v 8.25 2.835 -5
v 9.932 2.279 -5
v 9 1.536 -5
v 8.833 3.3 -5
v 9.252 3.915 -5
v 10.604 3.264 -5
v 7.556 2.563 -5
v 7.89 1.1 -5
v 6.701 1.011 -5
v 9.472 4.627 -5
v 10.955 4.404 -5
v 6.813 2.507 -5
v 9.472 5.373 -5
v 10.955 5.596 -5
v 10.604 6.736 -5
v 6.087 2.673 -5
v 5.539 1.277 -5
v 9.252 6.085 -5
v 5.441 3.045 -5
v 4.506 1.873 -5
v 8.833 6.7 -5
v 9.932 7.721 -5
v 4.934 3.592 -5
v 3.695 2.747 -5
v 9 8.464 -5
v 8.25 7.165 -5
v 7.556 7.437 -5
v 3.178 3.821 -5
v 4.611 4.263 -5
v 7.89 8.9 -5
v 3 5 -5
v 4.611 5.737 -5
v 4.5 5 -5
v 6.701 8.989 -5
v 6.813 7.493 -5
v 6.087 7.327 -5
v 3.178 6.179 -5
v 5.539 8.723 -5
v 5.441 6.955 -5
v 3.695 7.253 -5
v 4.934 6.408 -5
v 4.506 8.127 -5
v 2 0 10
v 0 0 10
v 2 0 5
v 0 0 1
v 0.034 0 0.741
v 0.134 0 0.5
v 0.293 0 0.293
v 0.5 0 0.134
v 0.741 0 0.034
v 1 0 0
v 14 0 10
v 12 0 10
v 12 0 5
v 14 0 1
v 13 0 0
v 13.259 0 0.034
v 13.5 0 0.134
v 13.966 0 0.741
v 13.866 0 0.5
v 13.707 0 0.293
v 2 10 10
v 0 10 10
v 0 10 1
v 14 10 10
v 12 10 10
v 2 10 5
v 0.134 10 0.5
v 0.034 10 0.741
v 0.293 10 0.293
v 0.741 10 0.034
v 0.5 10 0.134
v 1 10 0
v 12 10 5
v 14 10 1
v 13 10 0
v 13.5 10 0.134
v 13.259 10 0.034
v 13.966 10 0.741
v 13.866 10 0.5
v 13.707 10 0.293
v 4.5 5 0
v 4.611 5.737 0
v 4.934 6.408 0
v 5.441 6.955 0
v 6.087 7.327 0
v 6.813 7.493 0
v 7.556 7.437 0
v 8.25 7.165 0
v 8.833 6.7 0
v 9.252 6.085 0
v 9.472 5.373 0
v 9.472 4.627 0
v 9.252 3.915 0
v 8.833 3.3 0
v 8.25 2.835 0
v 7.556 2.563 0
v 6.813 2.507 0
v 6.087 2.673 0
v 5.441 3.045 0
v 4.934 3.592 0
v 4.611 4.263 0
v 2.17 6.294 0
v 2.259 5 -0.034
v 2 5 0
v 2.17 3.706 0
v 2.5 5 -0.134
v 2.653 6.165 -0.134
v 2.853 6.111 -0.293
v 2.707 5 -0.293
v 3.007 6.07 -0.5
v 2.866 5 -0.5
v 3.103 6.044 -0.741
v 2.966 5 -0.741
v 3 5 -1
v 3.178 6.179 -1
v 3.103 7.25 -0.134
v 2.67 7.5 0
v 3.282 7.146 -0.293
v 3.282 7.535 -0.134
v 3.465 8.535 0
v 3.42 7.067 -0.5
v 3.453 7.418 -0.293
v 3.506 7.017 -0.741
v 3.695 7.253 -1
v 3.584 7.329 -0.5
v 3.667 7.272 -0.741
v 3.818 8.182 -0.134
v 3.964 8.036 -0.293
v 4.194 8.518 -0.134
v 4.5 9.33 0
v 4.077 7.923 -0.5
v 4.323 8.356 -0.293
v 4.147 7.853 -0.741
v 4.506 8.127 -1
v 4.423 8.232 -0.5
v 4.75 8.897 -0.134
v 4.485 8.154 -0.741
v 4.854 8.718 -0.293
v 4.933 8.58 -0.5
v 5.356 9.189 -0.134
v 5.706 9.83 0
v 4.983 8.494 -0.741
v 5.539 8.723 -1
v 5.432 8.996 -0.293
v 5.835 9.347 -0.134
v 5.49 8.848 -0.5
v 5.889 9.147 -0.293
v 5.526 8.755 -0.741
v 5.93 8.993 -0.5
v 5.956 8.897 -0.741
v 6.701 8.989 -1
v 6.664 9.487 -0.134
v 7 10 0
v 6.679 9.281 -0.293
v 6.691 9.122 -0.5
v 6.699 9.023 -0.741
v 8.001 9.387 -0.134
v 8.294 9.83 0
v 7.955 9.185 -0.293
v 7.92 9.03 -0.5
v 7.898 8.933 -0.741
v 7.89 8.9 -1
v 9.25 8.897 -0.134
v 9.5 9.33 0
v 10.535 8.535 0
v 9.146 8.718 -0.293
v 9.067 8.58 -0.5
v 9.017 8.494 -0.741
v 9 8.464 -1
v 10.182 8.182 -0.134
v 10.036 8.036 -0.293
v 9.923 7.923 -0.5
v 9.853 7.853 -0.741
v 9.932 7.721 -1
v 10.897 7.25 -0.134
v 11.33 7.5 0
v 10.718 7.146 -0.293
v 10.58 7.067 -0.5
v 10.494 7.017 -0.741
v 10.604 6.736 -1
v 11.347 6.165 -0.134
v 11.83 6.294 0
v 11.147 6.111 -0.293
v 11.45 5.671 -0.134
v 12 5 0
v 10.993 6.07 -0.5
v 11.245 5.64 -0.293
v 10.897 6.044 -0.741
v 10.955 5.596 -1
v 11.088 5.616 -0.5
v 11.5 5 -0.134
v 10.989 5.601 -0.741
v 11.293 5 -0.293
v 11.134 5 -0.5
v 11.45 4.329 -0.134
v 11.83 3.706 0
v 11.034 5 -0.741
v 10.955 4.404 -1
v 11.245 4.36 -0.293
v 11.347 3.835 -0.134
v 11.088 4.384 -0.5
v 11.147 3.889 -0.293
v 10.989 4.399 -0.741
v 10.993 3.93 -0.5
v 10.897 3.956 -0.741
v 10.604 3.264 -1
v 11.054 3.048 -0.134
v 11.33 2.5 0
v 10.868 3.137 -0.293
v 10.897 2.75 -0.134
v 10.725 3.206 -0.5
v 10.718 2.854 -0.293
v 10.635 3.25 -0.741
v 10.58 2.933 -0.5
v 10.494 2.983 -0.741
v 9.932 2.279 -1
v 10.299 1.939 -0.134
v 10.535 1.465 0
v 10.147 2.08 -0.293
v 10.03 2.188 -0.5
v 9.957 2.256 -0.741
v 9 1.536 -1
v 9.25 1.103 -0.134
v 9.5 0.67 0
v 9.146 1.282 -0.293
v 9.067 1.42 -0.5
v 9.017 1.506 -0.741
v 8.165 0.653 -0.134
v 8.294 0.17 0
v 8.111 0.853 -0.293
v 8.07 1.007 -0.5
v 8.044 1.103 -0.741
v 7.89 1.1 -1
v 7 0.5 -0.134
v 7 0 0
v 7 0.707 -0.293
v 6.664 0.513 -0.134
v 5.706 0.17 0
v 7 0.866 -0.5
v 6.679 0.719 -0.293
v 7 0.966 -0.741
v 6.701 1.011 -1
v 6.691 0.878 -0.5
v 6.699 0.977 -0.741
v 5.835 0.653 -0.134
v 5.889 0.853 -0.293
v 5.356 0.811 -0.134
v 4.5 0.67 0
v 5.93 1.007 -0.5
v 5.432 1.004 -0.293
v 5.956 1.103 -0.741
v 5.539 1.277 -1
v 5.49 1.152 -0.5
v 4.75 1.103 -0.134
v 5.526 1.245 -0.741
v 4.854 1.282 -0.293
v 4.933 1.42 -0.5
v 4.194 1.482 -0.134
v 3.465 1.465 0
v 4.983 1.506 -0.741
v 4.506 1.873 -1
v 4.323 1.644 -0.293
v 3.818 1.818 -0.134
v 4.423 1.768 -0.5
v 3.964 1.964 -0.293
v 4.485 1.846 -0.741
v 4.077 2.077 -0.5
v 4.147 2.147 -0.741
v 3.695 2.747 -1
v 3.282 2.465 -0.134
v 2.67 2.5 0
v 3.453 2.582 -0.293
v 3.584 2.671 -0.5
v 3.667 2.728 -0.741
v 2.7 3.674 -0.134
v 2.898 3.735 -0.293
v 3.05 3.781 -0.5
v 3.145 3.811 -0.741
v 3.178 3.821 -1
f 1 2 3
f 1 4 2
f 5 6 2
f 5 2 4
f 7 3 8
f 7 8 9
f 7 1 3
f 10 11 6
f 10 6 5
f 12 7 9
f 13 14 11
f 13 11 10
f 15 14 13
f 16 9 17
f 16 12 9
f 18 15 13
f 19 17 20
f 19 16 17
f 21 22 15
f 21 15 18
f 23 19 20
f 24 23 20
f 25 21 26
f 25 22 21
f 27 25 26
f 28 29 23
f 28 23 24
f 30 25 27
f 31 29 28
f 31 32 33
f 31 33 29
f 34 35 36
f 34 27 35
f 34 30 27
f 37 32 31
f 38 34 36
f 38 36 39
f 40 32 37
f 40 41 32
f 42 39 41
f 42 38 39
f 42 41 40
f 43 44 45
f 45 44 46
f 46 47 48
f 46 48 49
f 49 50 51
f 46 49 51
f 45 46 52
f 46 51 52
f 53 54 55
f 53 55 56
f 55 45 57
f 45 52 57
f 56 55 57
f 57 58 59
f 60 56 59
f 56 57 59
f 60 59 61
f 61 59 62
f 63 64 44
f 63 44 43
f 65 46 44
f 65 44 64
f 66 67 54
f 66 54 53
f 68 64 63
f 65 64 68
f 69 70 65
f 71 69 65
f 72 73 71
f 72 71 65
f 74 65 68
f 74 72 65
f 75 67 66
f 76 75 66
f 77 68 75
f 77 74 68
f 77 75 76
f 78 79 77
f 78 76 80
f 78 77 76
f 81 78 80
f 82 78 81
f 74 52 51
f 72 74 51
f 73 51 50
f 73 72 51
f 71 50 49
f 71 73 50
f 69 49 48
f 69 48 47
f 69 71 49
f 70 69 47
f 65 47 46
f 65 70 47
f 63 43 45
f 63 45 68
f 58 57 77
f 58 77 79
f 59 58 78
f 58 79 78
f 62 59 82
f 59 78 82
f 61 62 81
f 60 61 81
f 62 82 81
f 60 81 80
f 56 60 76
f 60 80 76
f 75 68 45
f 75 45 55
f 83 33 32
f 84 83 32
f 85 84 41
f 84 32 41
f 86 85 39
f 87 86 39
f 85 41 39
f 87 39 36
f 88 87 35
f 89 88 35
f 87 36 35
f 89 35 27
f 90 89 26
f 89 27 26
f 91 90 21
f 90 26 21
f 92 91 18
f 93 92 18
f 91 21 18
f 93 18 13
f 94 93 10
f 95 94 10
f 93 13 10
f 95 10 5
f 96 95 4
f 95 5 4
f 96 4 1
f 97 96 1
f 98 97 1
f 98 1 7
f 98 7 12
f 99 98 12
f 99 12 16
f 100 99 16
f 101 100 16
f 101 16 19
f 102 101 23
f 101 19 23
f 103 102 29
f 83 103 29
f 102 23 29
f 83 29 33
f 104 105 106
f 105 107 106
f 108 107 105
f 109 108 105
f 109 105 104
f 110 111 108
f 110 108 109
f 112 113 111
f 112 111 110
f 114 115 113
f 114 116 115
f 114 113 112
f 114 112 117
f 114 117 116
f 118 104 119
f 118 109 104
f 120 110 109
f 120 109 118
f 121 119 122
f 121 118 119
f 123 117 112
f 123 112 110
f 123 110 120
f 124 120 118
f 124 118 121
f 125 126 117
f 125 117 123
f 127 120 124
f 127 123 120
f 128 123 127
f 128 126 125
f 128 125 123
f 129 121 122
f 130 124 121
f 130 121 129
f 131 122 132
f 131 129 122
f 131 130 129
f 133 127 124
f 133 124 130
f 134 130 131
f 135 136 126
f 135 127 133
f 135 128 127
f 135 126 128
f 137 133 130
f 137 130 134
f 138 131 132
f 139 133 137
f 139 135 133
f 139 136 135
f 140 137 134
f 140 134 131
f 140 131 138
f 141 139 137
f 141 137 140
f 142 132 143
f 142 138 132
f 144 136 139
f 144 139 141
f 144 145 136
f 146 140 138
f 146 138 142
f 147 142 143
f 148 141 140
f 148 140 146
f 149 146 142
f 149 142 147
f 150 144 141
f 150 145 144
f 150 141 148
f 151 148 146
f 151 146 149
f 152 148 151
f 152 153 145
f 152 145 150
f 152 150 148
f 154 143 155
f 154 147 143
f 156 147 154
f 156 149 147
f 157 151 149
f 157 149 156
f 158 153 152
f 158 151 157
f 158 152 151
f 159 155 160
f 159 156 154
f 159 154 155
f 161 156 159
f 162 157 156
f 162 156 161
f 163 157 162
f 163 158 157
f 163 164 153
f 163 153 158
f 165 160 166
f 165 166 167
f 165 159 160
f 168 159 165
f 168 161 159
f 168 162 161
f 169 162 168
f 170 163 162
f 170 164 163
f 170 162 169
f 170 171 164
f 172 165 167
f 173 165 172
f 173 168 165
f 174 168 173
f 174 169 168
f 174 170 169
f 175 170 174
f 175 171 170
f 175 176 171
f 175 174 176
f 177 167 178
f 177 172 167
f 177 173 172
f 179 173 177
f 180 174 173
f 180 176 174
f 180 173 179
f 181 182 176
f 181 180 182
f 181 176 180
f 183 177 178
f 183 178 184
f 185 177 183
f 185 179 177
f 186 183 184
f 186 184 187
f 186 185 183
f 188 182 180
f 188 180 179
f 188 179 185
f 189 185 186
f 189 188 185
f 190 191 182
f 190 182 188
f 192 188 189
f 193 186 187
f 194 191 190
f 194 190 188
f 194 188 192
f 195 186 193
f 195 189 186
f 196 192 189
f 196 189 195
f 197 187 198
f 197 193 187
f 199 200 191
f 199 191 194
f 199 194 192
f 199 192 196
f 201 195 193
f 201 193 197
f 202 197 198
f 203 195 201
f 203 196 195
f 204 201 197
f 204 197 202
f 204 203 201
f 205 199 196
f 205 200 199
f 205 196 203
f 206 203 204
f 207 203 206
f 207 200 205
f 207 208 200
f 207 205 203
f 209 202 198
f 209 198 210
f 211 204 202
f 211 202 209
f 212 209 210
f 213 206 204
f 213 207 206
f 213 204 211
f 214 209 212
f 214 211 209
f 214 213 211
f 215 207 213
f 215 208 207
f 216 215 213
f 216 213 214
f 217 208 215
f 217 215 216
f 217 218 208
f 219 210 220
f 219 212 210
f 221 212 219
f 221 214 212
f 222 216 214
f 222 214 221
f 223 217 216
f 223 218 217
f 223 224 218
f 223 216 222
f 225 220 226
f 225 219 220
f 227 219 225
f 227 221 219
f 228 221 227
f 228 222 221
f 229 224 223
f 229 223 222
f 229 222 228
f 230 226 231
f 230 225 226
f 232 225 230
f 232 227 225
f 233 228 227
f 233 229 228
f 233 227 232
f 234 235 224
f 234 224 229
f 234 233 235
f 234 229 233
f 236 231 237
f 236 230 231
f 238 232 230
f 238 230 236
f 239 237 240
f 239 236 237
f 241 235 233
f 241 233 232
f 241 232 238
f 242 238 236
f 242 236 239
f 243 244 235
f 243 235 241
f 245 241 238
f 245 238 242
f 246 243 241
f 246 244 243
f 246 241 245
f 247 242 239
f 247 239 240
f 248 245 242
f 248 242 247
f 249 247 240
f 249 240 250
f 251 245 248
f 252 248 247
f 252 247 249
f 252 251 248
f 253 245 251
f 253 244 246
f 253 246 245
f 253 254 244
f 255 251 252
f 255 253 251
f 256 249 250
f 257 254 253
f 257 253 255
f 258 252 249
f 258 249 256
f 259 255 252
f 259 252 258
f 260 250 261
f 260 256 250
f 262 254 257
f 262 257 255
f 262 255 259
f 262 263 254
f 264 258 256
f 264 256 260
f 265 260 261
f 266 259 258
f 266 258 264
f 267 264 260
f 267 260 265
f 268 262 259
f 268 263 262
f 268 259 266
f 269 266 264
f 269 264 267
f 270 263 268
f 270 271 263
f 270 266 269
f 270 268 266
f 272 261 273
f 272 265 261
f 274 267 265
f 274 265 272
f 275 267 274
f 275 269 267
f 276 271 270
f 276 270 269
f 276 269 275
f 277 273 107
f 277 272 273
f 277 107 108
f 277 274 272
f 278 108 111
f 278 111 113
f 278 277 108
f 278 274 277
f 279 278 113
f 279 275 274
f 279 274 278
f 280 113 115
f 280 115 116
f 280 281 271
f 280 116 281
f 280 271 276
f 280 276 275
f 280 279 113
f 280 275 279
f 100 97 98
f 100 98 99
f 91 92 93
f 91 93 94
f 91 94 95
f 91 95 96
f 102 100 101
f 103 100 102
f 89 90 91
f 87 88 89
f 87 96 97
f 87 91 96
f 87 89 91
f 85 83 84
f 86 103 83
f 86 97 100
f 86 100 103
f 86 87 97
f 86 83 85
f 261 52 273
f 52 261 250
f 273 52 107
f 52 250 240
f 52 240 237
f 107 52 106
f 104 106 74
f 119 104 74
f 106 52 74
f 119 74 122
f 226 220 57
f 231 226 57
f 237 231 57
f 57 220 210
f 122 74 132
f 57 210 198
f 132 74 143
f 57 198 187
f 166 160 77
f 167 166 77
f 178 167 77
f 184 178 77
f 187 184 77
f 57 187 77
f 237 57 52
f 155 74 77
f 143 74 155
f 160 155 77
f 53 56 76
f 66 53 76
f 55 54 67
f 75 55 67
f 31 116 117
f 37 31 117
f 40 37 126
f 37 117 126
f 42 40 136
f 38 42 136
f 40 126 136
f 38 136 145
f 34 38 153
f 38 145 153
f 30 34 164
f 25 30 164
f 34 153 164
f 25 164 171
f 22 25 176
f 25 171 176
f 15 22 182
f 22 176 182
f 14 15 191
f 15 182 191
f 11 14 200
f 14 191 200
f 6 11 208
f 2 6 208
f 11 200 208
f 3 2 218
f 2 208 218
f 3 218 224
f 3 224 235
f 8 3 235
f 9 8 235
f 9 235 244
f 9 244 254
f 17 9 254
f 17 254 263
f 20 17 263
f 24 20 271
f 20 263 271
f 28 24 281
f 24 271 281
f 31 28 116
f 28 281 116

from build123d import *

# Parameters (mm, degrees)
ESQUISSE1_W             = 14
ESQUISSE1_H             = 10
BOSS_EXTRU_1_DEPTH      = 10
ESQUISSE4_R             = 4
BOSS_EXTRU_2_DEPTH      = 5
ESQUISSE5_R             = 2.5
ENL_V_MAT_EXTRU_2_DEPTH = 5
CONG_3_R                = 1
CONG_4_R                = 1
ESQUISSE6_W             = 10
ESQUISSE6_H             = 10
ENL_V_MAT_EXTRU_3_DEPTH = 5


with BuildPart() as part:
    # Esquisse1 → Boss.-Extru.1 (new body)
    with BuildSketch(Plane.XY):
        with Locations((7, 5)):
            Rectangle(ESQUISSE1_W, ESQUISSE1_H)
    extrude(amount=BOSS_EXTRU_1_DEPTH)

    # Esquisse4 → Boss.-Extru.2 (add)
    with BuildSketch(Plane(origin=(0, 0, 0), x_dir=(-1, 0, 0), z_dir=(0, 0, -1))):
        with Locations((-7, 5)):
            Circle(ESQUISSE4_R)
    extrude(amount=BOSS_EXTRU_2_DEPTH)

    # Esquisse5 → Enlèv. mat.-Extru.2 (cut)
    with BuildSketch(Plane(origin=(0, 0, -5), x_dir=(-1, 0, 0), z_dir=(0, 0, -1))):
        with Locations((-7, 5)):
            Circle(ESQUISSE5_R)
    extrude(amount=-ENL_V_MAT_EXTRU_2_DEPTH, mode=Mode.SUBTRACT)

    # Congé3
    cong_3_edges = [part.edges().sort_by_distance(p)[0] for p in [
        (11, 5, 0),
    ]]
    fillet(cong_3_edges, radius=CONG_3_R - 0.0001)  # a hair under: the kernel refuses the full size

    # Congé4
    cong_4_edges = [part.edges().sort_by_distance(p)[0] for p in [
        (14, 5, 0),
        (0, 5, 0),
    ]]
    fillet(cong_4_edges, radius=CONG_4_R)

    # Esquisse6 → Enlèv. mat.-Extru.3 (cut)
    with BuildSketch(Plane.XY.offset(10)):
        with Locations((7, 5)):
            Rectangle(ESQUISSE6_W, ESQUISSE6_H)
    extrude(amount=-ENL_V_MAT_EXTRU_3_DEPTH, mode=Mode.SUBTRACT)


solid = part.part
